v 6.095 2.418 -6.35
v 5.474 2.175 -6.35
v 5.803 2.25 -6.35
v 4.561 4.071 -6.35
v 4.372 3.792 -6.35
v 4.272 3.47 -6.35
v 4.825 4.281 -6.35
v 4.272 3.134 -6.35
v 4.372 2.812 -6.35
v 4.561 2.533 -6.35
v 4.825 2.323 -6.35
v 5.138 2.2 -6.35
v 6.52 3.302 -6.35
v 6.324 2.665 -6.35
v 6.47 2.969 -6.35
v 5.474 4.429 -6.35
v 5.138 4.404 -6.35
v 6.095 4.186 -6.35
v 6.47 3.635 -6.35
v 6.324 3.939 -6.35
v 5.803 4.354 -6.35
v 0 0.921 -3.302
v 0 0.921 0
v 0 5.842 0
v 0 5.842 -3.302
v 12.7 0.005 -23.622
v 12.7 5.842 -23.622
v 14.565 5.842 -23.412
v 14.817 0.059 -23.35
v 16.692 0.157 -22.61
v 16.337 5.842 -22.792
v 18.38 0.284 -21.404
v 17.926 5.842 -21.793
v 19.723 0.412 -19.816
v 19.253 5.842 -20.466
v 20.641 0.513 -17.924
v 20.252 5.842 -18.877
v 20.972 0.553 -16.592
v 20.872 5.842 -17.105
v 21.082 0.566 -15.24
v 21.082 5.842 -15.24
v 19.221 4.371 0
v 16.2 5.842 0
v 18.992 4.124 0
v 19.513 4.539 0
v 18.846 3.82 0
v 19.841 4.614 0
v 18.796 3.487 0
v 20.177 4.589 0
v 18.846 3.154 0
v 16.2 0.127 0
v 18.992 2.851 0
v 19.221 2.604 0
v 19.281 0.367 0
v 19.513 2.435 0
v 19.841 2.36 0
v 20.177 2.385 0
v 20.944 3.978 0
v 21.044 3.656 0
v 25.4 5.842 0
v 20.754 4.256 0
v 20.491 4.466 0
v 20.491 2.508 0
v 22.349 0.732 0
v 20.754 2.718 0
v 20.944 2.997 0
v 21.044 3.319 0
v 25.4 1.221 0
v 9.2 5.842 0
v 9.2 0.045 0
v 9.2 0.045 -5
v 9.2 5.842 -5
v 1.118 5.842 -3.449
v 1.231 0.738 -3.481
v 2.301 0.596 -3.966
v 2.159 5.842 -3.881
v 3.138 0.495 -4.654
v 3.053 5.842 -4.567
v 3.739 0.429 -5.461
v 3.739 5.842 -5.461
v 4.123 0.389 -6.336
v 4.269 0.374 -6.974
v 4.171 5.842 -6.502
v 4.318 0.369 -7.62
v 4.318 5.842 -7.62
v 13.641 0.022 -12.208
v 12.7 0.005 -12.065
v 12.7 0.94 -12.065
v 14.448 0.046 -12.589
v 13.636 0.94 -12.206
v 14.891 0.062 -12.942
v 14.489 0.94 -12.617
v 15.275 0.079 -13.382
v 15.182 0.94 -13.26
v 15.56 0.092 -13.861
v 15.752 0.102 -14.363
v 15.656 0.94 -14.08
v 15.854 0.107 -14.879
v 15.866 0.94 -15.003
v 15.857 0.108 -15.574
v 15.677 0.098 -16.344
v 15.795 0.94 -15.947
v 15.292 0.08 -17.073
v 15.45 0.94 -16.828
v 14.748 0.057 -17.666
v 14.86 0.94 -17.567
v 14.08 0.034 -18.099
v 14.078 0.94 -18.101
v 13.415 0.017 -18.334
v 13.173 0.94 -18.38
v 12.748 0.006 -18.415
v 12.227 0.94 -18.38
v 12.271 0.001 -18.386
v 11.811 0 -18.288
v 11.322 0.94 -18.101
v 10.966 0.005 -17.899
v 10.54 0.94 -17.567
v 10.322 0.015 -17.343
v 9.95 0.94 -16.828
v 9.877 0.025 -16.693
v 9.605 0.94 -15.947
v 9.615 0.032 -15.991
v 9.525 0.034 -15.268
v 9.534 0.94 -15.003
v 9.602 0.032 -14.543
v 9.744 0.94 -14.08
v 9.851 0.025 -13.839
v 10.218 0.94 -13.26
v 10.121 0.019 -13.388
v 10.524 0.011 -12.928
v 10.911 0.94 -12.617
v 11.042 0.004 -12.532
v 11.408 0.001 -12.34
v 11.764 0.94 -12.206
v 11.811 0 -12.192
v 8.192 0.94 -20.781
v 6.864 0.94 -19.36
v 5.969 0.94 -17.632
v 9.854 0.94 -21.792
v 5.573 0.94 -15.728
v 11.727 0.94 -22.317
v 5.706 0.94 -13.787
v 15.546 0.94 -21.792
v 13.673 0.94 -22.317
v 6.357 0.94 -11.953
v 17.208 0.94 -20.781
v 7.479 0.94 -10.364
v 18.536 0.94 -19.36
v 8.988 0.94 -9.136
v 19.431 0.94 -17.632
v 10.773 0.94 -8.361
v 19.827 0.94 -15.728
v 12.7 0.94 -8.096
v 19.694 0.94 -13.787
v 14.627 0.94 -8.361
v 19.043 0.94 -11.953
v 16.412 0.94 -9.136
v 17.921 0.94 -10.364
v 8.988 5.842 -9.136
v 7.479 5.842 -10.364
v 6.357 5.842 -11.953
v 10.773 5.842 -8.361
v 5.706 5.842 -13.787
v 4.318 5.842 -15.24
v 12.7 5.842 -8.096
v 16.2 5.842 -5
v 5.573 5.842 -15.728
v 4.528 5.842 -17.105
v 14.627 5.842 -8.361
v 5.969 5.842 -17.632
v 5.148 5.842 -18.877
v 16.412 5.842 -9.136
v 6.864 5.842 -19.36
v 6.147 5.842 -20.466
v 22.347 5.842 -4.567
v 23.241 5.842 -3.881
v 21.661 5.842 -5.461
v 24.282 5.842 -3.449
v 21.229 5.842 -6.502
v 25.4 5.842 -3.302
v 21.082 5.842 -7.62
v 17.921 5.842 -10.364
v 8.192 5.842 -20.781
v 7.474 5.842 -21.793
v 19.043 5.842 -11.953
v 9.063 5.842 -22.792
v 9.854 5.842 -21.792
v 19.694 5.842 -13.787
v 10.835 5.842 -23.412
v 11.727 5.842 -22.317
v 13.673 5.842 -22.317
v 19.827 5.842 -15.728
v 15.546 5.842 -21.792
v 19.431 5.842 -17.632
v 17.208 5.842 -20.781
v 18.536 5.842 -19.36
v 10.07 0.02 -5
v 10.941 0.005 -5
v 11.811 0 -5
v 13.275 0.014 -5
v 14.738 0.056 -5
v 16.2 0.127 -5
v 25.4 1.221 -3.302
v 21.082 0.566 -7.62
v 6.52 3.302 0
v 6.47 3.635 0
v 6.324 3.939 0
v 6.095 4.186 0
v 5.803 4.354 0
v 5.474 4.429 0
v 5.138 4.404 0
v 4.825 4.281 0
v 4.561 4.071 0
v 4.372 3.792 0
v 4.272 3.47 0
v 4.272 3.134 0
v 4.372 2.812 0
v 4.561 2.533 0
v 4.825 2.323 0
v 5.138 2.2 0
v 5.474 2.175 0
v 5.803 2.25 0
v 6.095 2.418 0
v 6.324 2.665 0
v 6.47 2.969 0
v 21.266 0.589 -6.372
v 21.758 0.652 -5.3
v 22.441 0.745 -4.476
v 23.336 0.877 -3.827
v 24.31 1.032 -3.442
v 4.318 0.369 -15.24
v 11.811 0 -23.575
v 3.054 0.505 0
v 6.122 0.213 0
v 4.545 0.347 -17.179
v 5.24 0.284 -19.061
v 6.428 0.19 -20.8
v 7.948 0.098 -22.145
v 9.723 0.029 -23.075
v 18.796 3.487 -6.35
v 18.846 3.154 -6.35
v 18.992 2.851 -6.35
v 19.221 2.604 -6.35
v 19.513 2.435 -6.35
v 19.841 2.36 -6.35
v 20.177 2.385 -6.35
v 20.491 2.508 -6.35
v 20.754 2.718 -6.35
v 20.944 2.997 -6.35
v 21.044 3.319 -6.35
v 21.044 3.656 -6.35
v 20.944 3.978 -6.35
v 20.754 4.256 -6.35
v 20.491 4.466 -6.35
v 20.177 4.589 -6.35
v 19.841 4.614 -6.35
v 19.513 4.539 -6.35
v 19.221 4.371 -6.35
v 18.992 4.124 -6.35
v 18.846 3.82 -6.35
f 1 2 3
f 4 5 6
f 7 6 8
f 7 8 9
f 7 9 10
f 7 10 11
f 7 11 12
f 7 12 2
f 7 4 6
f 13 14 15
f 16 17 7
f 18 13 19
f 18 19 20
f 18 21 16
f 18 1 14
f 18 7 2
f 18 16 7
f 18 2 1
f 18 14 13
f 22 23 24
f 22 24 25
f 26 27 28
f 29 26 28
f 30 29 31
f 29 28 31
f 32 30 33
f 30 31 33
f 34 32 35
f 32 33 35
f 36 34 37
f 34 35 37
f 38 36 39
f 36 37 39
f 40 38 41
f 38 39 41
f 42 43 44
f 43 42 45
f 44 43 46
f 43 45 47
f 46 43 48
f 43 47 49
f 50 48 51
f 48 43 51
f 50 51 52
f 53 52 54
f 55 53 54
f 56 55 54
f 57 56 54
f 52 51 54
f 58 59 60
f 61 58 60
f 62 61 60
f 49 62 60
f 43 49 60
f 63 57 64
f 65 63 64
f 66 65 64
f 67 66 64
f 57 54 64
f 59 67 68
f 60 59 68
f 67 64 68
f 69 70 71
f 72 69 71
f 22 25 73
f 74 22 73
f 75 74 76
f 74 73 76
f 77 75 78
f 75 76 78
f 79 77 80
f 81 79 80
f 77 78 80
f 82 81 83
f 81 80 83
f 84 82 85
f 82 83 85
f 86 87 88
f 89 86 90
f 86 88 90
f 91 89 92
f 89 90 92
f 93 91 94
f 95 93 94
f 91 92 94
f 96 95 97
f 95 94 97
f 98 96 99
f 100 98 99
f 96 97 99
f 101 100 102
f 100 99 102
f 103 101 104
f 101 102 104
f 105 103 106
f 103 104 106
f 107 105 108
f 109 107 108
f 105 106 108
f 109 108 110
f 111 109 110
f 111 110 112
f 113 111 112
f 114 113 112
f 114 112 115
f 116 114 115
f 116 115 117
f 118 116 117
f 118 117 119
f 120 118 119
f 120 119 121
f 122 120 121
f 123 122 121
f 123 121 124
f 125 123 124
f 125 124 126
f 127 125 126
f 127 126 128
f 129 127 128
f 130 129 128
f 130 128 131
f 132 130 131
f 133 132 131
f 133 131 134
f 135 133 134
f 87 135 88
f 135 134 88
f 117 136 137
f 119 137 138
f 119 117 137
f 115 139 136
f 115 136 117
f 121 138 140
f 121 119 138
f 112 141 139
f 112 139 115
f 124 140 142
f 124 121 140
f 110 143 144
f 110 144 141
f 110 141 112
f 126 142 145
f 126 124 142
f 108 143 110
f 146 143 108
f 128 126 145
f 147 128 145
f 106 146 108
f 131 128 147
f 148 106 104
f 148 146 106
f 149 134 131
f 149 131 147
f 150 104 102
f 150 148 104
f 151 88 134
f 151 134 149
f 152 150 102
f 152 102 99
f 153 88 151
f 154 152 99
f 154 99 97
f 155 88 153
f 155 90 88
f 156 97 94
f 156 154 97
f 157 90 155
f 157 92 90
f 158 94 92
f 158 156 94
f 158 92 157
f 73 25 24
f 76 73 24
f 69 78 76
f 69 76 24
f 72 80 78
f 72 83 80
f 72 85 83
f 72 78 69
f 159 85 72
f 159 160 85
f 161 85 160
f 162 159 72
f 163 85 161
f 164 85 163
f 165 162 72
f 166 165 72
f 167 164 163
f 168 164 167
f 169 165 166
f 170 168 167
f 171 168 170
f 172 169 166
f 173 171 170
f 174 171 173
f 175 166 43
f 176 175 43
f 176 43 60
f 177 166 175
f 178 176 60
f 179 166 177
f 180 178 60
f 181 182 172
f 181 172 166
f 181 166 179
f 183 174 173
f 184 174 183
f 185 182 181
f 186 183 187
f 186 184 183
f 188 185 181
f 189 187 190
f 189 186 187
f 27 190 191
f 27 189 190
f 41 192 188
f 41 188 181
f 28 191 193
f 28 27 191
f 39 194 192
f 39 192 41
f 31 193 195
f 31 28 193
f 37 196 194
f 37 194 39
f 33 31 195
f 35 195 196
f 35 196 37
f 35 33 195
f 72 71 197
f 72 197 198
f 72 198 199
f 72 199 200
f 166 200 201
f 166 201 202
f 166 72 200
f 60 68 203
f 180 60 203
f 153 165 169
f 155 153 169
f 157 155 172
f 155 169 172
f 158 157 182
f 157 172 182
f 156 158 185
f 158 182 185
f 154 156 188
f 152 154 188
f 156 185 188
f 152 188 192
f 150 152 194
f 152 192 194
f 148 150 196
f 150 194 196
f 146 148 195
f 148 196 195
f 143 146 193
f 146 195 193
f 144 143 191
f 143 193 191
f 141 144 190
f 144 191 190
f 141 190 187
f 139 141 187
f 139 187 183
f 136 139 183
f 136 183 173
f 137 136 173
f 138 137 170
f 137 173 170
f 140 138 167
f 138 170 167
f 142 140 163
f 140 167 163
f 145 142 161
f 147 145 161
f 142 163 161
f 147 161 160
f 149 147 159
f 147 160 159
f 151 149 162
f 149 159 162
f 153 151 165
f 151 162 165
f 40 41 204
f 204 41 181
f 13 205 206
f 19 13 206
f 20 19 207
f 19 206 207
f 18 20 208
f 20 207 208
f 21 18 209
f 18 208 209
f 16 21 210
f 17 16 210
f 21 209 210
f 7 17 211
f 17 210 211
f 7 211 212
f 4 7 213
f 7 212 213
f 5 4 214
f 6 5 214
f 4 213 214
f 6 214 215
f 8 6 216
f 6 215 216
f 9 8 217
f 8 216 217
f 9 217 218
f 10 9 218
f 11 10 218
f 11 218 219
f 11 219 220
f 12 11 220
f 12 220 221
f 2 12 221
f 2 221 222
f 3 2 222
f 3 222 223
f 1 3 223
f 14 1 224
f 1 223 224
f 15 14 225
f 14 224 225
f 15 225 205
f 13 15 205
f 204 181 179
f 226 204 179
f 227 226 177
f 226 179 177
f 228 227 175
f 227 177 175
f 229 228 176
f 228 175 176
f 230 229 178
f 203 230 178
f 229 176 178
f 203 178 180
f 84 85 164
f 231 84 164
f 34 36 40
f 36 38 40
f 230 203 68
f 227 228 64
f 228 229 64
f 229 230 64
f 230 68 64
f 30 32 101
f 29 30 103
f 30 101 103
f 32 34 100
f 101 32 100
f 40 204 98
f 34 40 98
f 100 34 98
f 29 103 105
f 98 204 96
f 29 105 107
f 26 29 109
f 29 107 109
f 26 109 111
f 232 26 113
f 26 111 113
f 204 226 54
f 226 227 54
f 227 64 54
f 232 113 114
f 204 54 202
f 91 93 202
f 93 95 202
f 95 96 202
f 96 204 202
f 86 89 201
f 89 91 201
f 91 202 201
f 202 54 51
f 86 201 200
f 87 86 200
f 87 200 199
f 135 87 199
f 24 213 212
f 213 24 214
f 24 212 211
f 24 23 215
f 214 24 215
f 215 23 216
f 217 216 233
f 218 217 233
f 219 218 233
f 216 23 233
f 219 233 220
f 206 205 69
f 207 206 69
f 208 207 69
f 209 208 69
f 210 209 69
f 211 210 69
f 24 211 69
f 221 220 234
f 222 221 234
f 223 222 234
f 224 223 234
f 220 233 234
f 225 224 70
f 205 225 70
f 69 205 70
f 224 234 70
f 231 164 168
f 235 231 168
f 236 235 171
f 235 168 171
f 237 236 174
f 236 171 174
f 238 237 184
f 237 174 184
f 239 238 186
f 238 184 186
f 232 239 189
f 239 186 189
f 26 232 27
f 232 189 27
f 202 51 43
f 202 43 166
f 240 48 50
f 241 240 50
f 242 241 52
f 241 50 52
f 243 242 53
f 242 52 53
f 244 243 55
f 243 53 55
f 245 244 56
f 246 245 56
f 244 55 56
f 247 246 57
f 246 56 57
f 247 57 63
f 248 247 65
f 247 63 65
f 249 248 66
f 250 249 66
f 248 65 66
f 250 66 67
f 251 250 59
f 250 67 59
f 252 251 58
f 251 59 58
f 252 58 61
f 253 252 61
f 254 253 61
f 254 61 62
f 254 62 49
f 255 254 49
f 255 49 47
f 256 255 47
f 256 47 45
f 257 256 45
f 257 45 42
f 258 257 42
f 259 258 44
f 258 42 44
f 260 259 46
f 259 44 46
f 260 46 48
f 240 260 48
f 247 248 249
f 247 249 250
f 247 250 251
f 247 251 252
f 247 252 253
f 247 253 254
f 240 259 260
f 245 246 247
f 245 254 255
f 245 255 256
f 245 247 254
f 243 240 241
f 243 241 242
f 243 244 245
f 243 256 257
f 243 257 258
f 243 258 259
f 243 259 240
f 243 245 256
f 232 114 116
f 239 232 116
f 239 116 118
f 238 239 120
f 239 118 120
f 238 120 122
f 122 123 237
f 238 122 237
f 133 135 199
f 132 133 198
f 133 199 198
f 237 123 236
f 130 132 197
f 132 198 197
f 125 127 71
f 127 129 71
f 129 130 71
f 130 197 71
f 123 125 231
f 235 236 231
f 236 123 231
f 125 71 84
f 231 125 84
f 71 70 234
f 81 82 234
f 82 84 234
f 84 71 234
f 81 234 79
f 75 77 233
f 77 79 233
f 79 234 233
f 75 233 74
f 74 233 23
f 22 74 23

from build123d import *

# Parameters (mm, degrees)
SKETCH1_W           = 25.4
SKETCH1_H           = 23.622
BOSS_EXTRUDE1_DEPTH = 5.842
SKETCH2_R           = 3.175
CUT_EXTRUDE1_DEPTH  = 36.175102672
SKETCH3_R           = 7.14375
CUT_EXTRUDE2_DEPTH  = 4.9022
CUT_EXTRUDE3_DEPTH  = 36.175102672
CUT_EXTRUDE4_DEPTH  = 36.175102672
SKETCH6_W           = 7
SKETCH6_H           = 5
CUT_EXTRUDE5_DEPTH  = 36.175102828
SKETCH8_R           = 1.1303
CUT_EXTRUDE6_DEPTH  = 6.35


with BuildPart() as part:
    # Sketch1 → Boss-Extrude1 (new body)
    with BuildSketch(Plane(origin=(0, 0, 0), x_dir=(1, 0, 0), z_dir=(0, 1, 0))):
        with Locations((12.7, 11.811)):
            Rectangle(SKETCH1_W, SKETCH1_H)
    extrude(amount=BOSS_EXTRUDE1_DEPTH)

    # Sketch2 → Cut-Extrude1 (cut, through all)
    with BuildSketch(Plane(origin=(0, 5.842, 0), x_dir=(1, 0, 0), z_dir=(0, 1, 0))):
        with Locations(Location((12.7, 15.24, 0), (0, 0, 270))):
            Circle(SKETCH2_R)
    extrude(amount=-CUT_EXTRUDE1_DEPTH, mode=Mode.SUBTRACT)

    # Sketch3 → Cut-Extrude2 (cut)
    with BuildSketch(Plane(origin=(0, 5.842, 0), x_dir=(1, 0, 0), z_dir=(0, 1, 0))):
        with Locations(Location((12.7, 15.24, 0), (0, 0, 270))):
            Circle(SKETCH3_R)
    extrude(amount=-CUT_EXTRUDE2_DEPTH, mode=Mode.SUBTRACT)

    # Sketch4 → Cut-Extrude3 (cut, through all)
    with BuildSketch(Plane(origin=(0, 5.842, 0), x_dir=(1, 0, 0), z_dir=(0, 1, 0))):
        with BuildLine():
            ThreePointArc((4.318, 15.24), (6.77303096, 21.16696904), (12.7, 23.622))
            Line((12.7, 23.622), (0, 23.622))
            Line((0, 23.622), (0, 3.302))
            ThreePointArc((0, 3.302), (3.053287081, 4.566712919), (4.318, 7.62))
            Line((4.318, 7.62), (4.318, 15.24))
        make_face()
        with BuildLine():
            ThreePointArc((12.7, 23.622), (18.62696904, 21.16696904), (21.082, 15.24))
            Line((21.082, 15.24), (21.082, 7.62))
            ThreePointArc((21.082, 7.62), (22.346712919, 4.566712919), (25.4, 3.302))
            Line((25.4, 3.302), (25.4, 23.622))
            Line((25.4, 23.622), (12.7, 23.622))
        make_face()
    extrude(amount=-CUT_EXTRUDE3_DEPTH, mode=Mode.SUBTRACT)

    # Sketch5 → Cut-Extrude4 (cut, through all)
    with BuildSketch(Plane.XY):
        with BuildLine():
            Line((0, 0.920917387), (0, 0))
            Line((0, 0), (11.811, 0))
            ThreePointArc((11.811, 0), (5.887575951, 0.230578207), (0, 0.920917387))
        make_face()
        with BuildLine():
            ThreePointArc((25.4, 1.221475881), (18.632893512, 0.305983313), (11.811, 0))
            Line((11.811, 0), (25.4, 0))
            Line((25.4, 0), (25.4, 1.221475881))
        make_face()
    extrude(amount=-CUT_EXTRUDE4_DEPTH, mode=Mode.SUBTRACT)

    # Sketch6 → Cut-Extrude5 (cut, through all)
    with BuildSketch(Plane(origin=(0, 5.842, 0), x_dir=(1, 0, 0), z_dir=(0, 1, 0))):
        with Locations((12.700000015, 2.5)):
            Rectangle(SKETCH6_W, SKETCH6_H)
    extrude(amount=-CUT_EXTRUDE5_DEPTH, mode=Mode.SUBTRACT)

    # Sketch8 → Cut-Extrude6 (cut)
    with BuildSketch(Plane.XY):
        with Locations((5.390000015, 3.302)):
            Circle(SKETCH8_R)
        with Locations(Location((19.925856856, 3.487249582, 0), (0, 0, 180))):
            Circle(SKETCH8_R)
    extrude(amount=-CUT_EXTRUDE6_DEPTH, mode=Mode.SUBTRACT)


solid = part.part
